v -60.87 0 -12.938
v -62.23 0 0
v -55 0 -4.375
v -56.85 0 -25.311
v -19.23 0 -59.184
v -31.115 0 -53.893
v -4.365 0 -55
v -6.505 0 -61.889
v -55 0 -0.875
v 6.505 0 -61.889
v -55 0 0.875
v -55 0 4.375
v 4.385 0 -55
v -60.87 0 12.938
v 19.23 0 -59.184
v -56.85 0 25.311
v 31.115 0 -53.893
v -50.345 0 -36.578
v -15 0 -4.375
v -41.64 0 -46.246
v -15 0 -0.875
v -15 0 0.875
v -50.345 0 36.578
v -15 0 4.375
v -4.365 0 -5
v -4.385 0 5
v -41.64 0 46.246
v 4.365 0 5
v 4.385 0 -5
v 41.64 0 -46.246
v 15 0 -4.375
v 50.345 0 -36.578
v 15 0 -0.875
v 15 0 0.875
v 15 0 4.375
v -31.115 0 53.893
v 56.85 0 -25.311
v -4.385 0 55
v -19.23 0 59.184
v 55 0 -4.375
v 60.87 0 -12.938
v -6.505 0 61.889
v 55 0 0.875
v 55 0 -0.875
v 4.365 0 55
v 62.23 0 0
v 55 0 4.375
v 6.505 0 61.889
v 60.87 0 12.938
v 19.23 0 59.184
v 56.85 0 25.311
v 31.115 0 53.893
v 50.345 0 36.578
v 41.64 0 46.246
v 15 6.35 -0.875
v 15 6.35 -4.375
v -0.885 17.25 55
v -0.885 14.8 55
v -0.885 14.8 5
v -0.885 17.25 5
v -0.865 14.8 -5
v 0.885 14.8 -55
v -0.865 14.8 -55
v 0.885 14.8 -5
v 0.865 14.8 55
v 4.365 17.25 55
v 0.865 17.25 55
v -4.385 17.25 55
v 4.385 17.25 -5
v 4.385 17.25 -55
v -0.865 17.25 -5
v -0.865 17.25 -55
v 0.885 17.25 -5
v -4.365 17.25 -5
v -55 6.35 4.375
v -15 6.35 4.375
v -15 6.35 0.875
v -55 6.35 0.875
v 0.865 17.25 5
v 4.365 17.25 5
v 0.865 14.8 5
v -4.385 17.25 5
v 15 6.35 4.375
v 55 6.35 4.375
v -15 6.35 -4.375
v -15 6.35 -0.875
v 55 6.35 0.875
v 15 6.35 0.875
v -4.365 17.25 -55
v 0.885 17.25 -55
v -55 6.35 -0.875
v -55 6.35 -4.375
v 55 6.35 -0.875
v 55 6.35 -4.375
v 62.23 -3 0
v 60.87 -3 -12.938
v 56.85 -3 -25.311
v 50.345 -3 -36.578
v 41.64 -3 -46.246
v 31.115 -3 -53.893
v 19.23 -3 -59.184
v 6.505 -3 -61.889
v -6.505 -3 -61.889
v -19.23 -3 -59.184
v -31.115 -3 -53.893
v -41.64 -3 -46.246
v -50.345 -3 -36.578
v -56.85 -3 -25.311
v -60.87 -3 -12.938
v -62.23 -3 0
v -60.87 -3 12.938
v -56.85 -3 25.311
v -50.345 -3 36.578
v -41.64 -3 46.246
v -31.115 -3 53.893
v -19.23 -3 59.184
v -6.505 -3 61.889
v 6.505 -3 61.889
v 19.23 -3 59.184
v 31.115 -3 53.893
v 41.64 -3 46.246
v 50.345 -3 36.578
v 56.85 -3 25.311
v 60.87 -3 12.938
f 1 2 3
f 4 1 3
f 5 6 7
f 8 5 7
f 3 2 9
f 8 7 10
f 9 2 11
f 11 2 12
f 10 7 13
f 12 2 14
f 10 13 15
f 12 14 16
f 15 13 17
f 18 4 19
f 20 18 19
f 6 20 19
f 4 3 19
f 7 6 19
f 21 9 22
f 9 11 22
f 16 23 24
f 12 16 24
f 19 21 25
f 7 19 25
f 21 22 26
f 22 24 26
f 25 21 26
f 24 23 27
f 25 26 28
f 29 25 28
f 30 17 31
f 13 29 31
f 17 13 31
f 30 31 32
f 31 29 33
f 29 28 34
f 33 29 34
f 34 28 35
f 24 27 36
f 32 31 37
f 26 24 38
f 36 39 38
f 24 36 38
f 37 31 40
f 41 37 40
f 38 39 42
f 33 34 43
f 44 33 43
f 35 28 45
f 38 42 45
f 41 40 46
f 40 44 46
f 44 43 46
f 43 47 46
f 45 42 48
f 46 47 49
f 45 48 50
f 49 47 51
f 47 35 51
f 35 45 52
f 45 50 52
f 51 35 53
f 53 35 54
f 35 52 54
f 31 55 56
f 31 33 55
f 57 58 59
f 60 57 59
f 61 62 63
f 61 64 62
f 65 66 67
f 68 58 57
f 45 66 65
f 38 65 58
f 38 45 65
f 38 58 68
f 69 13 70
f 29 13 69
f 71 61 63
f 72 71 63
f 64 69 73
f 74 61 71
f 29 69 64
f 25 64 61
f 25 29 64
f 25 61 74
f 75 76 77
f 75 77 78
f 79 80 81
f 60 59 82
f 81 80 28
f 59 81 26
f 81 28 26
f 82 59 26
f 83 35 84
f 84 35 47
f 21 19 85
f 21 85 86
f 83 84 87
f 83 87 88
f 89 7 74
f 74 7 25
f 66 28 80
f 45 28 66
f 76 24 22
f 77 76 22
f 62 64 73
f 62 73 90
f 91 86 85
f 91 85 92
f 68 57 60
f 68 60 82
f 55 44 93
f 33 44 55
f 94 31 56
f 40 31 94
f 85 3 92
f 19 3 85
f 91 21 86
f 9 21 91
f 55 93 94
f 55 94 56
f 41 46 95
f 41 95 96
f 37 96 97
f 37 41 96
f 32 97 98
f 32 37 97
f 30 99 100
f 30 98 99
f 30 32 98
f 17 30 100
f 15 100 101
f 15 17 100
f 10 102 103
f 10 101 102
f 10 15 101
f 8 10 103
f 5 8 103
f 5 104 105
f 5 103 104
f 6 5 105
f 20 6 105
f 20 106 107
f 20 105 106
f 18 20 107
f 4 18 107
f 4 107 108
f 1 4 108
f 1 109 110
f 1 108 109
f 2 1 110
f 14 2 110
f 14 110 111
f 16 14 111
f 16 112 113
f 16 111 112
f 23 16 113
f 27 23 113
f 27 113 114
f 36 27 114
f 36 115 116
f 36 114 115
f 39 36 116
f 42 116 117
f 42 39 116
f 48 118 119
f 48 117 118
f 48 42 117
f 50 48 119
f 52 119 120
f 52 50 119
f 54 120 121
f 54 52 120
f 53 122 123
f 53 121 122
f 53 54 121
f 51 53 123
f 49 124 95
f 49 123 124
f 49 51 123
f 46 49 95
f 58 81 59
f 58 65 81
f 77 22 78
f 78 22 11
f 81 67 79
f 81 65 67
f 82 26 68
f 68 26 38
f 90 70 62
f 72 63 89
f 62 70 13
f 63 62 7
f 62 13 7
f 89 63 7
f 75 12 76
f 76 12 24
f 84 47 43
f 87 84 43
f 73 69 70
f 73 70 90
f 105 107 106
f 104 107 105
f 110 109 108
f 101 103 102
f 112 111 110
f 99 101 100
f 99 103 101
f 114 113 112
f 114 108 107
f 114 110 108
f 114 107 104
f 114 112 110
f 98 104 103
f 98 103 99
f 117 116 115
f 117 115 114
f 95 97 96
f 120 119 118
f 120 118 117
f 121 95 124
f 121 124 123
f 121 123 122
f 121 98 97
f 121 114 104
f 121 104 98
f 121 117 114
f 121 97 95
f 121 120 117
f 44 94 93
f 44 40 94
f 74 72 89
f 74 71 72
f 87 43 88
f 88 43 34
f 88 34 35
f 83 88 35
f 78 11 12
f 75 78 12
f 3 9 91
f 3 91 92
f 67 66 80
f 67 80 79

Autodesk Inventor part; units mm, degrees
ref_plane "YZ Plane" through (0, 0, 0) normal (1, 0, 0) x (0, 1, 0)
ref_plane "XZ Plane" through (0, 0, 0) normal (0, 1, 0) x (-1, 0, 0)
ref_plane "XY Plane" through (0, 0, 0) normal (0, 0, 1) x (1, 0, 0)
sketch "Sketch1" plane through (0, 0, 0) normal (0, 1, 0) x (-1, 0, 0)
  line L0 (4.385, 55) -> (0.885, 55)
  line L1 (0.885, 55) -> (0.885, 5)
  line L2 (0.885, 5) -> (4.385, 5)
  line L3 (4.385, 5) -> (4.385, 55)
  line L4 (-0.865, 5) -> (-4.365, 5)
  line L5 (-4.365, 5) -> (-4.365, 55)
  line L6 (-4.365, 55) -> (-0.865, 55)
  line L7 (-0.865, 55) -> (-0.865, 5)
  line L8 (0.885, 5) -> (-0.865, 5)
  line L9 (-0.865, 55) -> (0.885, 55)
  line L10 (4.365, -5) -> (0.865, -5)
  line L11 (0.865, -5) -> (0.865, -55)
  line L12 (0.865, -55) -> (4.365, -55)
  line L13 (4.365, -55) -> (4.365, -5)
  line L14 (-0.885, -55) -> (-4.385, -55)
  line L15 (-4.385, -55) -> (-4.385, -5)
  line L16 (-4.385, -5) -> (-0.885, -5)
  line L17 (-0.885, -5) -> (-0.885, -55)
  line L18 (-0.885, -5) -> (0.865, -5)
  line L19 (0.865, -55) -> (-0.885, -55)
  line L20 (55, -4.375) -> (15, -4.375)
  line L21 (15, -4.375) -> (15, -0.875)
  line L22 (15, -0.875) -> (55, -0.875)
  line L23 (55, -0.875) -> (55, -4.375)
  line L24 (15, 0.875) -> (55, 0.875)
  line L25 (55, 0.875) -> (55, 4.375)
  line L26 (55, 4.375) -> (15, 4.375)
  line L27 (15, 4.375) -> (15, 0.875)
  line L28 (-15, -4.375) -> (-55, -4.375)
  line L29 (-55, -4.375) -> (-55, -0.875)
  line L30 (-55, -0.875) -> (-15, -0.875)
  line L31 (-15, -0.875) -> (-15, -4.375)
  line L32 (-55, 0.875) -> (-15, 0.875)
  line L33 (-15, 0.875) -> (-15, 4.375)
  line L34 (-15, 4.375) -> (-55, 4.375)
  line L35 (-55, 4.375) -> (-55, 0.875)
  line L36 (-15, 0.875) -> (-15, -0.875) construction
  line L37 (-55, -0.875) -> (-55, 0.875) construction
  line L38 (15, 0.875) -> (15, -0.875) construction
  line L39 (55, -0.875) -> (55, 0.875) construction
  line L40 (15, -4.375) -> (-15, -4.375) construction
  line L41 (-15, 4.375) -> (15, 4.375) construction
  line L42 (15, -4.375) -> (0, 0) construction
  line L43 (0, 0) -> (-15, -4.375) construction
  line L44 (-15, 4.375) -> (0, 0) construction
  line L45 (-4.385, -5) -> (0, 0) construction
  line L46 (0, 0) -> (4.385, 5) construction
  line L47 (0, 0) -> (4.365, -5) construction
  line L48 (0, 0) -> (-4.365, 5) construction
  point P0 (-0.01, -5)
  point P1 (0.01, 5)
  dimension "d0" = 1.75
  dimension "d2" = 110
  dimension "d3" = 3.5
  dimension "d5" = 40
  dimension "d15" = 30
  dimension "d16" = 10
  dimension "d21" = 0.01
extrude "Extrusion1" add sketch "Sketch1" along normal blind 6.35 contours L20 L21 L22 L23 | L27 L26 L25 L24 | L28 L29 L30 L31 | L35 L34 L33 L32
extrude "Extrusion3" add sketch "Sketch1" along normal blind 17.25 contours L3 L2 L1 L0 | L7 L4 L5 L6 | L13 L12 L11 L10 | L17 L14 L15 L16
sketch "Sketch2" plane through (0, 0, 0) normal (0, -1, 0) x (1, 0, 0)
  circle A0 centre (0, 0) radius 62.23
  dimension "d8" = 124.46
extrude "Extrusion2" add sketch "Sketch2" along normal blind 3
extrude "Extrusion4" add sketch "Sketch1" along normal blind 14.8 contours L3 L2 L1 L0 | L1 L8 L7 L9 | L7 L4 L5 L6 | L13 L12 L11 L10 | L11 L19 L17 L18 | L17 L14 L15 L16
properties part number "Soldering Jig"
